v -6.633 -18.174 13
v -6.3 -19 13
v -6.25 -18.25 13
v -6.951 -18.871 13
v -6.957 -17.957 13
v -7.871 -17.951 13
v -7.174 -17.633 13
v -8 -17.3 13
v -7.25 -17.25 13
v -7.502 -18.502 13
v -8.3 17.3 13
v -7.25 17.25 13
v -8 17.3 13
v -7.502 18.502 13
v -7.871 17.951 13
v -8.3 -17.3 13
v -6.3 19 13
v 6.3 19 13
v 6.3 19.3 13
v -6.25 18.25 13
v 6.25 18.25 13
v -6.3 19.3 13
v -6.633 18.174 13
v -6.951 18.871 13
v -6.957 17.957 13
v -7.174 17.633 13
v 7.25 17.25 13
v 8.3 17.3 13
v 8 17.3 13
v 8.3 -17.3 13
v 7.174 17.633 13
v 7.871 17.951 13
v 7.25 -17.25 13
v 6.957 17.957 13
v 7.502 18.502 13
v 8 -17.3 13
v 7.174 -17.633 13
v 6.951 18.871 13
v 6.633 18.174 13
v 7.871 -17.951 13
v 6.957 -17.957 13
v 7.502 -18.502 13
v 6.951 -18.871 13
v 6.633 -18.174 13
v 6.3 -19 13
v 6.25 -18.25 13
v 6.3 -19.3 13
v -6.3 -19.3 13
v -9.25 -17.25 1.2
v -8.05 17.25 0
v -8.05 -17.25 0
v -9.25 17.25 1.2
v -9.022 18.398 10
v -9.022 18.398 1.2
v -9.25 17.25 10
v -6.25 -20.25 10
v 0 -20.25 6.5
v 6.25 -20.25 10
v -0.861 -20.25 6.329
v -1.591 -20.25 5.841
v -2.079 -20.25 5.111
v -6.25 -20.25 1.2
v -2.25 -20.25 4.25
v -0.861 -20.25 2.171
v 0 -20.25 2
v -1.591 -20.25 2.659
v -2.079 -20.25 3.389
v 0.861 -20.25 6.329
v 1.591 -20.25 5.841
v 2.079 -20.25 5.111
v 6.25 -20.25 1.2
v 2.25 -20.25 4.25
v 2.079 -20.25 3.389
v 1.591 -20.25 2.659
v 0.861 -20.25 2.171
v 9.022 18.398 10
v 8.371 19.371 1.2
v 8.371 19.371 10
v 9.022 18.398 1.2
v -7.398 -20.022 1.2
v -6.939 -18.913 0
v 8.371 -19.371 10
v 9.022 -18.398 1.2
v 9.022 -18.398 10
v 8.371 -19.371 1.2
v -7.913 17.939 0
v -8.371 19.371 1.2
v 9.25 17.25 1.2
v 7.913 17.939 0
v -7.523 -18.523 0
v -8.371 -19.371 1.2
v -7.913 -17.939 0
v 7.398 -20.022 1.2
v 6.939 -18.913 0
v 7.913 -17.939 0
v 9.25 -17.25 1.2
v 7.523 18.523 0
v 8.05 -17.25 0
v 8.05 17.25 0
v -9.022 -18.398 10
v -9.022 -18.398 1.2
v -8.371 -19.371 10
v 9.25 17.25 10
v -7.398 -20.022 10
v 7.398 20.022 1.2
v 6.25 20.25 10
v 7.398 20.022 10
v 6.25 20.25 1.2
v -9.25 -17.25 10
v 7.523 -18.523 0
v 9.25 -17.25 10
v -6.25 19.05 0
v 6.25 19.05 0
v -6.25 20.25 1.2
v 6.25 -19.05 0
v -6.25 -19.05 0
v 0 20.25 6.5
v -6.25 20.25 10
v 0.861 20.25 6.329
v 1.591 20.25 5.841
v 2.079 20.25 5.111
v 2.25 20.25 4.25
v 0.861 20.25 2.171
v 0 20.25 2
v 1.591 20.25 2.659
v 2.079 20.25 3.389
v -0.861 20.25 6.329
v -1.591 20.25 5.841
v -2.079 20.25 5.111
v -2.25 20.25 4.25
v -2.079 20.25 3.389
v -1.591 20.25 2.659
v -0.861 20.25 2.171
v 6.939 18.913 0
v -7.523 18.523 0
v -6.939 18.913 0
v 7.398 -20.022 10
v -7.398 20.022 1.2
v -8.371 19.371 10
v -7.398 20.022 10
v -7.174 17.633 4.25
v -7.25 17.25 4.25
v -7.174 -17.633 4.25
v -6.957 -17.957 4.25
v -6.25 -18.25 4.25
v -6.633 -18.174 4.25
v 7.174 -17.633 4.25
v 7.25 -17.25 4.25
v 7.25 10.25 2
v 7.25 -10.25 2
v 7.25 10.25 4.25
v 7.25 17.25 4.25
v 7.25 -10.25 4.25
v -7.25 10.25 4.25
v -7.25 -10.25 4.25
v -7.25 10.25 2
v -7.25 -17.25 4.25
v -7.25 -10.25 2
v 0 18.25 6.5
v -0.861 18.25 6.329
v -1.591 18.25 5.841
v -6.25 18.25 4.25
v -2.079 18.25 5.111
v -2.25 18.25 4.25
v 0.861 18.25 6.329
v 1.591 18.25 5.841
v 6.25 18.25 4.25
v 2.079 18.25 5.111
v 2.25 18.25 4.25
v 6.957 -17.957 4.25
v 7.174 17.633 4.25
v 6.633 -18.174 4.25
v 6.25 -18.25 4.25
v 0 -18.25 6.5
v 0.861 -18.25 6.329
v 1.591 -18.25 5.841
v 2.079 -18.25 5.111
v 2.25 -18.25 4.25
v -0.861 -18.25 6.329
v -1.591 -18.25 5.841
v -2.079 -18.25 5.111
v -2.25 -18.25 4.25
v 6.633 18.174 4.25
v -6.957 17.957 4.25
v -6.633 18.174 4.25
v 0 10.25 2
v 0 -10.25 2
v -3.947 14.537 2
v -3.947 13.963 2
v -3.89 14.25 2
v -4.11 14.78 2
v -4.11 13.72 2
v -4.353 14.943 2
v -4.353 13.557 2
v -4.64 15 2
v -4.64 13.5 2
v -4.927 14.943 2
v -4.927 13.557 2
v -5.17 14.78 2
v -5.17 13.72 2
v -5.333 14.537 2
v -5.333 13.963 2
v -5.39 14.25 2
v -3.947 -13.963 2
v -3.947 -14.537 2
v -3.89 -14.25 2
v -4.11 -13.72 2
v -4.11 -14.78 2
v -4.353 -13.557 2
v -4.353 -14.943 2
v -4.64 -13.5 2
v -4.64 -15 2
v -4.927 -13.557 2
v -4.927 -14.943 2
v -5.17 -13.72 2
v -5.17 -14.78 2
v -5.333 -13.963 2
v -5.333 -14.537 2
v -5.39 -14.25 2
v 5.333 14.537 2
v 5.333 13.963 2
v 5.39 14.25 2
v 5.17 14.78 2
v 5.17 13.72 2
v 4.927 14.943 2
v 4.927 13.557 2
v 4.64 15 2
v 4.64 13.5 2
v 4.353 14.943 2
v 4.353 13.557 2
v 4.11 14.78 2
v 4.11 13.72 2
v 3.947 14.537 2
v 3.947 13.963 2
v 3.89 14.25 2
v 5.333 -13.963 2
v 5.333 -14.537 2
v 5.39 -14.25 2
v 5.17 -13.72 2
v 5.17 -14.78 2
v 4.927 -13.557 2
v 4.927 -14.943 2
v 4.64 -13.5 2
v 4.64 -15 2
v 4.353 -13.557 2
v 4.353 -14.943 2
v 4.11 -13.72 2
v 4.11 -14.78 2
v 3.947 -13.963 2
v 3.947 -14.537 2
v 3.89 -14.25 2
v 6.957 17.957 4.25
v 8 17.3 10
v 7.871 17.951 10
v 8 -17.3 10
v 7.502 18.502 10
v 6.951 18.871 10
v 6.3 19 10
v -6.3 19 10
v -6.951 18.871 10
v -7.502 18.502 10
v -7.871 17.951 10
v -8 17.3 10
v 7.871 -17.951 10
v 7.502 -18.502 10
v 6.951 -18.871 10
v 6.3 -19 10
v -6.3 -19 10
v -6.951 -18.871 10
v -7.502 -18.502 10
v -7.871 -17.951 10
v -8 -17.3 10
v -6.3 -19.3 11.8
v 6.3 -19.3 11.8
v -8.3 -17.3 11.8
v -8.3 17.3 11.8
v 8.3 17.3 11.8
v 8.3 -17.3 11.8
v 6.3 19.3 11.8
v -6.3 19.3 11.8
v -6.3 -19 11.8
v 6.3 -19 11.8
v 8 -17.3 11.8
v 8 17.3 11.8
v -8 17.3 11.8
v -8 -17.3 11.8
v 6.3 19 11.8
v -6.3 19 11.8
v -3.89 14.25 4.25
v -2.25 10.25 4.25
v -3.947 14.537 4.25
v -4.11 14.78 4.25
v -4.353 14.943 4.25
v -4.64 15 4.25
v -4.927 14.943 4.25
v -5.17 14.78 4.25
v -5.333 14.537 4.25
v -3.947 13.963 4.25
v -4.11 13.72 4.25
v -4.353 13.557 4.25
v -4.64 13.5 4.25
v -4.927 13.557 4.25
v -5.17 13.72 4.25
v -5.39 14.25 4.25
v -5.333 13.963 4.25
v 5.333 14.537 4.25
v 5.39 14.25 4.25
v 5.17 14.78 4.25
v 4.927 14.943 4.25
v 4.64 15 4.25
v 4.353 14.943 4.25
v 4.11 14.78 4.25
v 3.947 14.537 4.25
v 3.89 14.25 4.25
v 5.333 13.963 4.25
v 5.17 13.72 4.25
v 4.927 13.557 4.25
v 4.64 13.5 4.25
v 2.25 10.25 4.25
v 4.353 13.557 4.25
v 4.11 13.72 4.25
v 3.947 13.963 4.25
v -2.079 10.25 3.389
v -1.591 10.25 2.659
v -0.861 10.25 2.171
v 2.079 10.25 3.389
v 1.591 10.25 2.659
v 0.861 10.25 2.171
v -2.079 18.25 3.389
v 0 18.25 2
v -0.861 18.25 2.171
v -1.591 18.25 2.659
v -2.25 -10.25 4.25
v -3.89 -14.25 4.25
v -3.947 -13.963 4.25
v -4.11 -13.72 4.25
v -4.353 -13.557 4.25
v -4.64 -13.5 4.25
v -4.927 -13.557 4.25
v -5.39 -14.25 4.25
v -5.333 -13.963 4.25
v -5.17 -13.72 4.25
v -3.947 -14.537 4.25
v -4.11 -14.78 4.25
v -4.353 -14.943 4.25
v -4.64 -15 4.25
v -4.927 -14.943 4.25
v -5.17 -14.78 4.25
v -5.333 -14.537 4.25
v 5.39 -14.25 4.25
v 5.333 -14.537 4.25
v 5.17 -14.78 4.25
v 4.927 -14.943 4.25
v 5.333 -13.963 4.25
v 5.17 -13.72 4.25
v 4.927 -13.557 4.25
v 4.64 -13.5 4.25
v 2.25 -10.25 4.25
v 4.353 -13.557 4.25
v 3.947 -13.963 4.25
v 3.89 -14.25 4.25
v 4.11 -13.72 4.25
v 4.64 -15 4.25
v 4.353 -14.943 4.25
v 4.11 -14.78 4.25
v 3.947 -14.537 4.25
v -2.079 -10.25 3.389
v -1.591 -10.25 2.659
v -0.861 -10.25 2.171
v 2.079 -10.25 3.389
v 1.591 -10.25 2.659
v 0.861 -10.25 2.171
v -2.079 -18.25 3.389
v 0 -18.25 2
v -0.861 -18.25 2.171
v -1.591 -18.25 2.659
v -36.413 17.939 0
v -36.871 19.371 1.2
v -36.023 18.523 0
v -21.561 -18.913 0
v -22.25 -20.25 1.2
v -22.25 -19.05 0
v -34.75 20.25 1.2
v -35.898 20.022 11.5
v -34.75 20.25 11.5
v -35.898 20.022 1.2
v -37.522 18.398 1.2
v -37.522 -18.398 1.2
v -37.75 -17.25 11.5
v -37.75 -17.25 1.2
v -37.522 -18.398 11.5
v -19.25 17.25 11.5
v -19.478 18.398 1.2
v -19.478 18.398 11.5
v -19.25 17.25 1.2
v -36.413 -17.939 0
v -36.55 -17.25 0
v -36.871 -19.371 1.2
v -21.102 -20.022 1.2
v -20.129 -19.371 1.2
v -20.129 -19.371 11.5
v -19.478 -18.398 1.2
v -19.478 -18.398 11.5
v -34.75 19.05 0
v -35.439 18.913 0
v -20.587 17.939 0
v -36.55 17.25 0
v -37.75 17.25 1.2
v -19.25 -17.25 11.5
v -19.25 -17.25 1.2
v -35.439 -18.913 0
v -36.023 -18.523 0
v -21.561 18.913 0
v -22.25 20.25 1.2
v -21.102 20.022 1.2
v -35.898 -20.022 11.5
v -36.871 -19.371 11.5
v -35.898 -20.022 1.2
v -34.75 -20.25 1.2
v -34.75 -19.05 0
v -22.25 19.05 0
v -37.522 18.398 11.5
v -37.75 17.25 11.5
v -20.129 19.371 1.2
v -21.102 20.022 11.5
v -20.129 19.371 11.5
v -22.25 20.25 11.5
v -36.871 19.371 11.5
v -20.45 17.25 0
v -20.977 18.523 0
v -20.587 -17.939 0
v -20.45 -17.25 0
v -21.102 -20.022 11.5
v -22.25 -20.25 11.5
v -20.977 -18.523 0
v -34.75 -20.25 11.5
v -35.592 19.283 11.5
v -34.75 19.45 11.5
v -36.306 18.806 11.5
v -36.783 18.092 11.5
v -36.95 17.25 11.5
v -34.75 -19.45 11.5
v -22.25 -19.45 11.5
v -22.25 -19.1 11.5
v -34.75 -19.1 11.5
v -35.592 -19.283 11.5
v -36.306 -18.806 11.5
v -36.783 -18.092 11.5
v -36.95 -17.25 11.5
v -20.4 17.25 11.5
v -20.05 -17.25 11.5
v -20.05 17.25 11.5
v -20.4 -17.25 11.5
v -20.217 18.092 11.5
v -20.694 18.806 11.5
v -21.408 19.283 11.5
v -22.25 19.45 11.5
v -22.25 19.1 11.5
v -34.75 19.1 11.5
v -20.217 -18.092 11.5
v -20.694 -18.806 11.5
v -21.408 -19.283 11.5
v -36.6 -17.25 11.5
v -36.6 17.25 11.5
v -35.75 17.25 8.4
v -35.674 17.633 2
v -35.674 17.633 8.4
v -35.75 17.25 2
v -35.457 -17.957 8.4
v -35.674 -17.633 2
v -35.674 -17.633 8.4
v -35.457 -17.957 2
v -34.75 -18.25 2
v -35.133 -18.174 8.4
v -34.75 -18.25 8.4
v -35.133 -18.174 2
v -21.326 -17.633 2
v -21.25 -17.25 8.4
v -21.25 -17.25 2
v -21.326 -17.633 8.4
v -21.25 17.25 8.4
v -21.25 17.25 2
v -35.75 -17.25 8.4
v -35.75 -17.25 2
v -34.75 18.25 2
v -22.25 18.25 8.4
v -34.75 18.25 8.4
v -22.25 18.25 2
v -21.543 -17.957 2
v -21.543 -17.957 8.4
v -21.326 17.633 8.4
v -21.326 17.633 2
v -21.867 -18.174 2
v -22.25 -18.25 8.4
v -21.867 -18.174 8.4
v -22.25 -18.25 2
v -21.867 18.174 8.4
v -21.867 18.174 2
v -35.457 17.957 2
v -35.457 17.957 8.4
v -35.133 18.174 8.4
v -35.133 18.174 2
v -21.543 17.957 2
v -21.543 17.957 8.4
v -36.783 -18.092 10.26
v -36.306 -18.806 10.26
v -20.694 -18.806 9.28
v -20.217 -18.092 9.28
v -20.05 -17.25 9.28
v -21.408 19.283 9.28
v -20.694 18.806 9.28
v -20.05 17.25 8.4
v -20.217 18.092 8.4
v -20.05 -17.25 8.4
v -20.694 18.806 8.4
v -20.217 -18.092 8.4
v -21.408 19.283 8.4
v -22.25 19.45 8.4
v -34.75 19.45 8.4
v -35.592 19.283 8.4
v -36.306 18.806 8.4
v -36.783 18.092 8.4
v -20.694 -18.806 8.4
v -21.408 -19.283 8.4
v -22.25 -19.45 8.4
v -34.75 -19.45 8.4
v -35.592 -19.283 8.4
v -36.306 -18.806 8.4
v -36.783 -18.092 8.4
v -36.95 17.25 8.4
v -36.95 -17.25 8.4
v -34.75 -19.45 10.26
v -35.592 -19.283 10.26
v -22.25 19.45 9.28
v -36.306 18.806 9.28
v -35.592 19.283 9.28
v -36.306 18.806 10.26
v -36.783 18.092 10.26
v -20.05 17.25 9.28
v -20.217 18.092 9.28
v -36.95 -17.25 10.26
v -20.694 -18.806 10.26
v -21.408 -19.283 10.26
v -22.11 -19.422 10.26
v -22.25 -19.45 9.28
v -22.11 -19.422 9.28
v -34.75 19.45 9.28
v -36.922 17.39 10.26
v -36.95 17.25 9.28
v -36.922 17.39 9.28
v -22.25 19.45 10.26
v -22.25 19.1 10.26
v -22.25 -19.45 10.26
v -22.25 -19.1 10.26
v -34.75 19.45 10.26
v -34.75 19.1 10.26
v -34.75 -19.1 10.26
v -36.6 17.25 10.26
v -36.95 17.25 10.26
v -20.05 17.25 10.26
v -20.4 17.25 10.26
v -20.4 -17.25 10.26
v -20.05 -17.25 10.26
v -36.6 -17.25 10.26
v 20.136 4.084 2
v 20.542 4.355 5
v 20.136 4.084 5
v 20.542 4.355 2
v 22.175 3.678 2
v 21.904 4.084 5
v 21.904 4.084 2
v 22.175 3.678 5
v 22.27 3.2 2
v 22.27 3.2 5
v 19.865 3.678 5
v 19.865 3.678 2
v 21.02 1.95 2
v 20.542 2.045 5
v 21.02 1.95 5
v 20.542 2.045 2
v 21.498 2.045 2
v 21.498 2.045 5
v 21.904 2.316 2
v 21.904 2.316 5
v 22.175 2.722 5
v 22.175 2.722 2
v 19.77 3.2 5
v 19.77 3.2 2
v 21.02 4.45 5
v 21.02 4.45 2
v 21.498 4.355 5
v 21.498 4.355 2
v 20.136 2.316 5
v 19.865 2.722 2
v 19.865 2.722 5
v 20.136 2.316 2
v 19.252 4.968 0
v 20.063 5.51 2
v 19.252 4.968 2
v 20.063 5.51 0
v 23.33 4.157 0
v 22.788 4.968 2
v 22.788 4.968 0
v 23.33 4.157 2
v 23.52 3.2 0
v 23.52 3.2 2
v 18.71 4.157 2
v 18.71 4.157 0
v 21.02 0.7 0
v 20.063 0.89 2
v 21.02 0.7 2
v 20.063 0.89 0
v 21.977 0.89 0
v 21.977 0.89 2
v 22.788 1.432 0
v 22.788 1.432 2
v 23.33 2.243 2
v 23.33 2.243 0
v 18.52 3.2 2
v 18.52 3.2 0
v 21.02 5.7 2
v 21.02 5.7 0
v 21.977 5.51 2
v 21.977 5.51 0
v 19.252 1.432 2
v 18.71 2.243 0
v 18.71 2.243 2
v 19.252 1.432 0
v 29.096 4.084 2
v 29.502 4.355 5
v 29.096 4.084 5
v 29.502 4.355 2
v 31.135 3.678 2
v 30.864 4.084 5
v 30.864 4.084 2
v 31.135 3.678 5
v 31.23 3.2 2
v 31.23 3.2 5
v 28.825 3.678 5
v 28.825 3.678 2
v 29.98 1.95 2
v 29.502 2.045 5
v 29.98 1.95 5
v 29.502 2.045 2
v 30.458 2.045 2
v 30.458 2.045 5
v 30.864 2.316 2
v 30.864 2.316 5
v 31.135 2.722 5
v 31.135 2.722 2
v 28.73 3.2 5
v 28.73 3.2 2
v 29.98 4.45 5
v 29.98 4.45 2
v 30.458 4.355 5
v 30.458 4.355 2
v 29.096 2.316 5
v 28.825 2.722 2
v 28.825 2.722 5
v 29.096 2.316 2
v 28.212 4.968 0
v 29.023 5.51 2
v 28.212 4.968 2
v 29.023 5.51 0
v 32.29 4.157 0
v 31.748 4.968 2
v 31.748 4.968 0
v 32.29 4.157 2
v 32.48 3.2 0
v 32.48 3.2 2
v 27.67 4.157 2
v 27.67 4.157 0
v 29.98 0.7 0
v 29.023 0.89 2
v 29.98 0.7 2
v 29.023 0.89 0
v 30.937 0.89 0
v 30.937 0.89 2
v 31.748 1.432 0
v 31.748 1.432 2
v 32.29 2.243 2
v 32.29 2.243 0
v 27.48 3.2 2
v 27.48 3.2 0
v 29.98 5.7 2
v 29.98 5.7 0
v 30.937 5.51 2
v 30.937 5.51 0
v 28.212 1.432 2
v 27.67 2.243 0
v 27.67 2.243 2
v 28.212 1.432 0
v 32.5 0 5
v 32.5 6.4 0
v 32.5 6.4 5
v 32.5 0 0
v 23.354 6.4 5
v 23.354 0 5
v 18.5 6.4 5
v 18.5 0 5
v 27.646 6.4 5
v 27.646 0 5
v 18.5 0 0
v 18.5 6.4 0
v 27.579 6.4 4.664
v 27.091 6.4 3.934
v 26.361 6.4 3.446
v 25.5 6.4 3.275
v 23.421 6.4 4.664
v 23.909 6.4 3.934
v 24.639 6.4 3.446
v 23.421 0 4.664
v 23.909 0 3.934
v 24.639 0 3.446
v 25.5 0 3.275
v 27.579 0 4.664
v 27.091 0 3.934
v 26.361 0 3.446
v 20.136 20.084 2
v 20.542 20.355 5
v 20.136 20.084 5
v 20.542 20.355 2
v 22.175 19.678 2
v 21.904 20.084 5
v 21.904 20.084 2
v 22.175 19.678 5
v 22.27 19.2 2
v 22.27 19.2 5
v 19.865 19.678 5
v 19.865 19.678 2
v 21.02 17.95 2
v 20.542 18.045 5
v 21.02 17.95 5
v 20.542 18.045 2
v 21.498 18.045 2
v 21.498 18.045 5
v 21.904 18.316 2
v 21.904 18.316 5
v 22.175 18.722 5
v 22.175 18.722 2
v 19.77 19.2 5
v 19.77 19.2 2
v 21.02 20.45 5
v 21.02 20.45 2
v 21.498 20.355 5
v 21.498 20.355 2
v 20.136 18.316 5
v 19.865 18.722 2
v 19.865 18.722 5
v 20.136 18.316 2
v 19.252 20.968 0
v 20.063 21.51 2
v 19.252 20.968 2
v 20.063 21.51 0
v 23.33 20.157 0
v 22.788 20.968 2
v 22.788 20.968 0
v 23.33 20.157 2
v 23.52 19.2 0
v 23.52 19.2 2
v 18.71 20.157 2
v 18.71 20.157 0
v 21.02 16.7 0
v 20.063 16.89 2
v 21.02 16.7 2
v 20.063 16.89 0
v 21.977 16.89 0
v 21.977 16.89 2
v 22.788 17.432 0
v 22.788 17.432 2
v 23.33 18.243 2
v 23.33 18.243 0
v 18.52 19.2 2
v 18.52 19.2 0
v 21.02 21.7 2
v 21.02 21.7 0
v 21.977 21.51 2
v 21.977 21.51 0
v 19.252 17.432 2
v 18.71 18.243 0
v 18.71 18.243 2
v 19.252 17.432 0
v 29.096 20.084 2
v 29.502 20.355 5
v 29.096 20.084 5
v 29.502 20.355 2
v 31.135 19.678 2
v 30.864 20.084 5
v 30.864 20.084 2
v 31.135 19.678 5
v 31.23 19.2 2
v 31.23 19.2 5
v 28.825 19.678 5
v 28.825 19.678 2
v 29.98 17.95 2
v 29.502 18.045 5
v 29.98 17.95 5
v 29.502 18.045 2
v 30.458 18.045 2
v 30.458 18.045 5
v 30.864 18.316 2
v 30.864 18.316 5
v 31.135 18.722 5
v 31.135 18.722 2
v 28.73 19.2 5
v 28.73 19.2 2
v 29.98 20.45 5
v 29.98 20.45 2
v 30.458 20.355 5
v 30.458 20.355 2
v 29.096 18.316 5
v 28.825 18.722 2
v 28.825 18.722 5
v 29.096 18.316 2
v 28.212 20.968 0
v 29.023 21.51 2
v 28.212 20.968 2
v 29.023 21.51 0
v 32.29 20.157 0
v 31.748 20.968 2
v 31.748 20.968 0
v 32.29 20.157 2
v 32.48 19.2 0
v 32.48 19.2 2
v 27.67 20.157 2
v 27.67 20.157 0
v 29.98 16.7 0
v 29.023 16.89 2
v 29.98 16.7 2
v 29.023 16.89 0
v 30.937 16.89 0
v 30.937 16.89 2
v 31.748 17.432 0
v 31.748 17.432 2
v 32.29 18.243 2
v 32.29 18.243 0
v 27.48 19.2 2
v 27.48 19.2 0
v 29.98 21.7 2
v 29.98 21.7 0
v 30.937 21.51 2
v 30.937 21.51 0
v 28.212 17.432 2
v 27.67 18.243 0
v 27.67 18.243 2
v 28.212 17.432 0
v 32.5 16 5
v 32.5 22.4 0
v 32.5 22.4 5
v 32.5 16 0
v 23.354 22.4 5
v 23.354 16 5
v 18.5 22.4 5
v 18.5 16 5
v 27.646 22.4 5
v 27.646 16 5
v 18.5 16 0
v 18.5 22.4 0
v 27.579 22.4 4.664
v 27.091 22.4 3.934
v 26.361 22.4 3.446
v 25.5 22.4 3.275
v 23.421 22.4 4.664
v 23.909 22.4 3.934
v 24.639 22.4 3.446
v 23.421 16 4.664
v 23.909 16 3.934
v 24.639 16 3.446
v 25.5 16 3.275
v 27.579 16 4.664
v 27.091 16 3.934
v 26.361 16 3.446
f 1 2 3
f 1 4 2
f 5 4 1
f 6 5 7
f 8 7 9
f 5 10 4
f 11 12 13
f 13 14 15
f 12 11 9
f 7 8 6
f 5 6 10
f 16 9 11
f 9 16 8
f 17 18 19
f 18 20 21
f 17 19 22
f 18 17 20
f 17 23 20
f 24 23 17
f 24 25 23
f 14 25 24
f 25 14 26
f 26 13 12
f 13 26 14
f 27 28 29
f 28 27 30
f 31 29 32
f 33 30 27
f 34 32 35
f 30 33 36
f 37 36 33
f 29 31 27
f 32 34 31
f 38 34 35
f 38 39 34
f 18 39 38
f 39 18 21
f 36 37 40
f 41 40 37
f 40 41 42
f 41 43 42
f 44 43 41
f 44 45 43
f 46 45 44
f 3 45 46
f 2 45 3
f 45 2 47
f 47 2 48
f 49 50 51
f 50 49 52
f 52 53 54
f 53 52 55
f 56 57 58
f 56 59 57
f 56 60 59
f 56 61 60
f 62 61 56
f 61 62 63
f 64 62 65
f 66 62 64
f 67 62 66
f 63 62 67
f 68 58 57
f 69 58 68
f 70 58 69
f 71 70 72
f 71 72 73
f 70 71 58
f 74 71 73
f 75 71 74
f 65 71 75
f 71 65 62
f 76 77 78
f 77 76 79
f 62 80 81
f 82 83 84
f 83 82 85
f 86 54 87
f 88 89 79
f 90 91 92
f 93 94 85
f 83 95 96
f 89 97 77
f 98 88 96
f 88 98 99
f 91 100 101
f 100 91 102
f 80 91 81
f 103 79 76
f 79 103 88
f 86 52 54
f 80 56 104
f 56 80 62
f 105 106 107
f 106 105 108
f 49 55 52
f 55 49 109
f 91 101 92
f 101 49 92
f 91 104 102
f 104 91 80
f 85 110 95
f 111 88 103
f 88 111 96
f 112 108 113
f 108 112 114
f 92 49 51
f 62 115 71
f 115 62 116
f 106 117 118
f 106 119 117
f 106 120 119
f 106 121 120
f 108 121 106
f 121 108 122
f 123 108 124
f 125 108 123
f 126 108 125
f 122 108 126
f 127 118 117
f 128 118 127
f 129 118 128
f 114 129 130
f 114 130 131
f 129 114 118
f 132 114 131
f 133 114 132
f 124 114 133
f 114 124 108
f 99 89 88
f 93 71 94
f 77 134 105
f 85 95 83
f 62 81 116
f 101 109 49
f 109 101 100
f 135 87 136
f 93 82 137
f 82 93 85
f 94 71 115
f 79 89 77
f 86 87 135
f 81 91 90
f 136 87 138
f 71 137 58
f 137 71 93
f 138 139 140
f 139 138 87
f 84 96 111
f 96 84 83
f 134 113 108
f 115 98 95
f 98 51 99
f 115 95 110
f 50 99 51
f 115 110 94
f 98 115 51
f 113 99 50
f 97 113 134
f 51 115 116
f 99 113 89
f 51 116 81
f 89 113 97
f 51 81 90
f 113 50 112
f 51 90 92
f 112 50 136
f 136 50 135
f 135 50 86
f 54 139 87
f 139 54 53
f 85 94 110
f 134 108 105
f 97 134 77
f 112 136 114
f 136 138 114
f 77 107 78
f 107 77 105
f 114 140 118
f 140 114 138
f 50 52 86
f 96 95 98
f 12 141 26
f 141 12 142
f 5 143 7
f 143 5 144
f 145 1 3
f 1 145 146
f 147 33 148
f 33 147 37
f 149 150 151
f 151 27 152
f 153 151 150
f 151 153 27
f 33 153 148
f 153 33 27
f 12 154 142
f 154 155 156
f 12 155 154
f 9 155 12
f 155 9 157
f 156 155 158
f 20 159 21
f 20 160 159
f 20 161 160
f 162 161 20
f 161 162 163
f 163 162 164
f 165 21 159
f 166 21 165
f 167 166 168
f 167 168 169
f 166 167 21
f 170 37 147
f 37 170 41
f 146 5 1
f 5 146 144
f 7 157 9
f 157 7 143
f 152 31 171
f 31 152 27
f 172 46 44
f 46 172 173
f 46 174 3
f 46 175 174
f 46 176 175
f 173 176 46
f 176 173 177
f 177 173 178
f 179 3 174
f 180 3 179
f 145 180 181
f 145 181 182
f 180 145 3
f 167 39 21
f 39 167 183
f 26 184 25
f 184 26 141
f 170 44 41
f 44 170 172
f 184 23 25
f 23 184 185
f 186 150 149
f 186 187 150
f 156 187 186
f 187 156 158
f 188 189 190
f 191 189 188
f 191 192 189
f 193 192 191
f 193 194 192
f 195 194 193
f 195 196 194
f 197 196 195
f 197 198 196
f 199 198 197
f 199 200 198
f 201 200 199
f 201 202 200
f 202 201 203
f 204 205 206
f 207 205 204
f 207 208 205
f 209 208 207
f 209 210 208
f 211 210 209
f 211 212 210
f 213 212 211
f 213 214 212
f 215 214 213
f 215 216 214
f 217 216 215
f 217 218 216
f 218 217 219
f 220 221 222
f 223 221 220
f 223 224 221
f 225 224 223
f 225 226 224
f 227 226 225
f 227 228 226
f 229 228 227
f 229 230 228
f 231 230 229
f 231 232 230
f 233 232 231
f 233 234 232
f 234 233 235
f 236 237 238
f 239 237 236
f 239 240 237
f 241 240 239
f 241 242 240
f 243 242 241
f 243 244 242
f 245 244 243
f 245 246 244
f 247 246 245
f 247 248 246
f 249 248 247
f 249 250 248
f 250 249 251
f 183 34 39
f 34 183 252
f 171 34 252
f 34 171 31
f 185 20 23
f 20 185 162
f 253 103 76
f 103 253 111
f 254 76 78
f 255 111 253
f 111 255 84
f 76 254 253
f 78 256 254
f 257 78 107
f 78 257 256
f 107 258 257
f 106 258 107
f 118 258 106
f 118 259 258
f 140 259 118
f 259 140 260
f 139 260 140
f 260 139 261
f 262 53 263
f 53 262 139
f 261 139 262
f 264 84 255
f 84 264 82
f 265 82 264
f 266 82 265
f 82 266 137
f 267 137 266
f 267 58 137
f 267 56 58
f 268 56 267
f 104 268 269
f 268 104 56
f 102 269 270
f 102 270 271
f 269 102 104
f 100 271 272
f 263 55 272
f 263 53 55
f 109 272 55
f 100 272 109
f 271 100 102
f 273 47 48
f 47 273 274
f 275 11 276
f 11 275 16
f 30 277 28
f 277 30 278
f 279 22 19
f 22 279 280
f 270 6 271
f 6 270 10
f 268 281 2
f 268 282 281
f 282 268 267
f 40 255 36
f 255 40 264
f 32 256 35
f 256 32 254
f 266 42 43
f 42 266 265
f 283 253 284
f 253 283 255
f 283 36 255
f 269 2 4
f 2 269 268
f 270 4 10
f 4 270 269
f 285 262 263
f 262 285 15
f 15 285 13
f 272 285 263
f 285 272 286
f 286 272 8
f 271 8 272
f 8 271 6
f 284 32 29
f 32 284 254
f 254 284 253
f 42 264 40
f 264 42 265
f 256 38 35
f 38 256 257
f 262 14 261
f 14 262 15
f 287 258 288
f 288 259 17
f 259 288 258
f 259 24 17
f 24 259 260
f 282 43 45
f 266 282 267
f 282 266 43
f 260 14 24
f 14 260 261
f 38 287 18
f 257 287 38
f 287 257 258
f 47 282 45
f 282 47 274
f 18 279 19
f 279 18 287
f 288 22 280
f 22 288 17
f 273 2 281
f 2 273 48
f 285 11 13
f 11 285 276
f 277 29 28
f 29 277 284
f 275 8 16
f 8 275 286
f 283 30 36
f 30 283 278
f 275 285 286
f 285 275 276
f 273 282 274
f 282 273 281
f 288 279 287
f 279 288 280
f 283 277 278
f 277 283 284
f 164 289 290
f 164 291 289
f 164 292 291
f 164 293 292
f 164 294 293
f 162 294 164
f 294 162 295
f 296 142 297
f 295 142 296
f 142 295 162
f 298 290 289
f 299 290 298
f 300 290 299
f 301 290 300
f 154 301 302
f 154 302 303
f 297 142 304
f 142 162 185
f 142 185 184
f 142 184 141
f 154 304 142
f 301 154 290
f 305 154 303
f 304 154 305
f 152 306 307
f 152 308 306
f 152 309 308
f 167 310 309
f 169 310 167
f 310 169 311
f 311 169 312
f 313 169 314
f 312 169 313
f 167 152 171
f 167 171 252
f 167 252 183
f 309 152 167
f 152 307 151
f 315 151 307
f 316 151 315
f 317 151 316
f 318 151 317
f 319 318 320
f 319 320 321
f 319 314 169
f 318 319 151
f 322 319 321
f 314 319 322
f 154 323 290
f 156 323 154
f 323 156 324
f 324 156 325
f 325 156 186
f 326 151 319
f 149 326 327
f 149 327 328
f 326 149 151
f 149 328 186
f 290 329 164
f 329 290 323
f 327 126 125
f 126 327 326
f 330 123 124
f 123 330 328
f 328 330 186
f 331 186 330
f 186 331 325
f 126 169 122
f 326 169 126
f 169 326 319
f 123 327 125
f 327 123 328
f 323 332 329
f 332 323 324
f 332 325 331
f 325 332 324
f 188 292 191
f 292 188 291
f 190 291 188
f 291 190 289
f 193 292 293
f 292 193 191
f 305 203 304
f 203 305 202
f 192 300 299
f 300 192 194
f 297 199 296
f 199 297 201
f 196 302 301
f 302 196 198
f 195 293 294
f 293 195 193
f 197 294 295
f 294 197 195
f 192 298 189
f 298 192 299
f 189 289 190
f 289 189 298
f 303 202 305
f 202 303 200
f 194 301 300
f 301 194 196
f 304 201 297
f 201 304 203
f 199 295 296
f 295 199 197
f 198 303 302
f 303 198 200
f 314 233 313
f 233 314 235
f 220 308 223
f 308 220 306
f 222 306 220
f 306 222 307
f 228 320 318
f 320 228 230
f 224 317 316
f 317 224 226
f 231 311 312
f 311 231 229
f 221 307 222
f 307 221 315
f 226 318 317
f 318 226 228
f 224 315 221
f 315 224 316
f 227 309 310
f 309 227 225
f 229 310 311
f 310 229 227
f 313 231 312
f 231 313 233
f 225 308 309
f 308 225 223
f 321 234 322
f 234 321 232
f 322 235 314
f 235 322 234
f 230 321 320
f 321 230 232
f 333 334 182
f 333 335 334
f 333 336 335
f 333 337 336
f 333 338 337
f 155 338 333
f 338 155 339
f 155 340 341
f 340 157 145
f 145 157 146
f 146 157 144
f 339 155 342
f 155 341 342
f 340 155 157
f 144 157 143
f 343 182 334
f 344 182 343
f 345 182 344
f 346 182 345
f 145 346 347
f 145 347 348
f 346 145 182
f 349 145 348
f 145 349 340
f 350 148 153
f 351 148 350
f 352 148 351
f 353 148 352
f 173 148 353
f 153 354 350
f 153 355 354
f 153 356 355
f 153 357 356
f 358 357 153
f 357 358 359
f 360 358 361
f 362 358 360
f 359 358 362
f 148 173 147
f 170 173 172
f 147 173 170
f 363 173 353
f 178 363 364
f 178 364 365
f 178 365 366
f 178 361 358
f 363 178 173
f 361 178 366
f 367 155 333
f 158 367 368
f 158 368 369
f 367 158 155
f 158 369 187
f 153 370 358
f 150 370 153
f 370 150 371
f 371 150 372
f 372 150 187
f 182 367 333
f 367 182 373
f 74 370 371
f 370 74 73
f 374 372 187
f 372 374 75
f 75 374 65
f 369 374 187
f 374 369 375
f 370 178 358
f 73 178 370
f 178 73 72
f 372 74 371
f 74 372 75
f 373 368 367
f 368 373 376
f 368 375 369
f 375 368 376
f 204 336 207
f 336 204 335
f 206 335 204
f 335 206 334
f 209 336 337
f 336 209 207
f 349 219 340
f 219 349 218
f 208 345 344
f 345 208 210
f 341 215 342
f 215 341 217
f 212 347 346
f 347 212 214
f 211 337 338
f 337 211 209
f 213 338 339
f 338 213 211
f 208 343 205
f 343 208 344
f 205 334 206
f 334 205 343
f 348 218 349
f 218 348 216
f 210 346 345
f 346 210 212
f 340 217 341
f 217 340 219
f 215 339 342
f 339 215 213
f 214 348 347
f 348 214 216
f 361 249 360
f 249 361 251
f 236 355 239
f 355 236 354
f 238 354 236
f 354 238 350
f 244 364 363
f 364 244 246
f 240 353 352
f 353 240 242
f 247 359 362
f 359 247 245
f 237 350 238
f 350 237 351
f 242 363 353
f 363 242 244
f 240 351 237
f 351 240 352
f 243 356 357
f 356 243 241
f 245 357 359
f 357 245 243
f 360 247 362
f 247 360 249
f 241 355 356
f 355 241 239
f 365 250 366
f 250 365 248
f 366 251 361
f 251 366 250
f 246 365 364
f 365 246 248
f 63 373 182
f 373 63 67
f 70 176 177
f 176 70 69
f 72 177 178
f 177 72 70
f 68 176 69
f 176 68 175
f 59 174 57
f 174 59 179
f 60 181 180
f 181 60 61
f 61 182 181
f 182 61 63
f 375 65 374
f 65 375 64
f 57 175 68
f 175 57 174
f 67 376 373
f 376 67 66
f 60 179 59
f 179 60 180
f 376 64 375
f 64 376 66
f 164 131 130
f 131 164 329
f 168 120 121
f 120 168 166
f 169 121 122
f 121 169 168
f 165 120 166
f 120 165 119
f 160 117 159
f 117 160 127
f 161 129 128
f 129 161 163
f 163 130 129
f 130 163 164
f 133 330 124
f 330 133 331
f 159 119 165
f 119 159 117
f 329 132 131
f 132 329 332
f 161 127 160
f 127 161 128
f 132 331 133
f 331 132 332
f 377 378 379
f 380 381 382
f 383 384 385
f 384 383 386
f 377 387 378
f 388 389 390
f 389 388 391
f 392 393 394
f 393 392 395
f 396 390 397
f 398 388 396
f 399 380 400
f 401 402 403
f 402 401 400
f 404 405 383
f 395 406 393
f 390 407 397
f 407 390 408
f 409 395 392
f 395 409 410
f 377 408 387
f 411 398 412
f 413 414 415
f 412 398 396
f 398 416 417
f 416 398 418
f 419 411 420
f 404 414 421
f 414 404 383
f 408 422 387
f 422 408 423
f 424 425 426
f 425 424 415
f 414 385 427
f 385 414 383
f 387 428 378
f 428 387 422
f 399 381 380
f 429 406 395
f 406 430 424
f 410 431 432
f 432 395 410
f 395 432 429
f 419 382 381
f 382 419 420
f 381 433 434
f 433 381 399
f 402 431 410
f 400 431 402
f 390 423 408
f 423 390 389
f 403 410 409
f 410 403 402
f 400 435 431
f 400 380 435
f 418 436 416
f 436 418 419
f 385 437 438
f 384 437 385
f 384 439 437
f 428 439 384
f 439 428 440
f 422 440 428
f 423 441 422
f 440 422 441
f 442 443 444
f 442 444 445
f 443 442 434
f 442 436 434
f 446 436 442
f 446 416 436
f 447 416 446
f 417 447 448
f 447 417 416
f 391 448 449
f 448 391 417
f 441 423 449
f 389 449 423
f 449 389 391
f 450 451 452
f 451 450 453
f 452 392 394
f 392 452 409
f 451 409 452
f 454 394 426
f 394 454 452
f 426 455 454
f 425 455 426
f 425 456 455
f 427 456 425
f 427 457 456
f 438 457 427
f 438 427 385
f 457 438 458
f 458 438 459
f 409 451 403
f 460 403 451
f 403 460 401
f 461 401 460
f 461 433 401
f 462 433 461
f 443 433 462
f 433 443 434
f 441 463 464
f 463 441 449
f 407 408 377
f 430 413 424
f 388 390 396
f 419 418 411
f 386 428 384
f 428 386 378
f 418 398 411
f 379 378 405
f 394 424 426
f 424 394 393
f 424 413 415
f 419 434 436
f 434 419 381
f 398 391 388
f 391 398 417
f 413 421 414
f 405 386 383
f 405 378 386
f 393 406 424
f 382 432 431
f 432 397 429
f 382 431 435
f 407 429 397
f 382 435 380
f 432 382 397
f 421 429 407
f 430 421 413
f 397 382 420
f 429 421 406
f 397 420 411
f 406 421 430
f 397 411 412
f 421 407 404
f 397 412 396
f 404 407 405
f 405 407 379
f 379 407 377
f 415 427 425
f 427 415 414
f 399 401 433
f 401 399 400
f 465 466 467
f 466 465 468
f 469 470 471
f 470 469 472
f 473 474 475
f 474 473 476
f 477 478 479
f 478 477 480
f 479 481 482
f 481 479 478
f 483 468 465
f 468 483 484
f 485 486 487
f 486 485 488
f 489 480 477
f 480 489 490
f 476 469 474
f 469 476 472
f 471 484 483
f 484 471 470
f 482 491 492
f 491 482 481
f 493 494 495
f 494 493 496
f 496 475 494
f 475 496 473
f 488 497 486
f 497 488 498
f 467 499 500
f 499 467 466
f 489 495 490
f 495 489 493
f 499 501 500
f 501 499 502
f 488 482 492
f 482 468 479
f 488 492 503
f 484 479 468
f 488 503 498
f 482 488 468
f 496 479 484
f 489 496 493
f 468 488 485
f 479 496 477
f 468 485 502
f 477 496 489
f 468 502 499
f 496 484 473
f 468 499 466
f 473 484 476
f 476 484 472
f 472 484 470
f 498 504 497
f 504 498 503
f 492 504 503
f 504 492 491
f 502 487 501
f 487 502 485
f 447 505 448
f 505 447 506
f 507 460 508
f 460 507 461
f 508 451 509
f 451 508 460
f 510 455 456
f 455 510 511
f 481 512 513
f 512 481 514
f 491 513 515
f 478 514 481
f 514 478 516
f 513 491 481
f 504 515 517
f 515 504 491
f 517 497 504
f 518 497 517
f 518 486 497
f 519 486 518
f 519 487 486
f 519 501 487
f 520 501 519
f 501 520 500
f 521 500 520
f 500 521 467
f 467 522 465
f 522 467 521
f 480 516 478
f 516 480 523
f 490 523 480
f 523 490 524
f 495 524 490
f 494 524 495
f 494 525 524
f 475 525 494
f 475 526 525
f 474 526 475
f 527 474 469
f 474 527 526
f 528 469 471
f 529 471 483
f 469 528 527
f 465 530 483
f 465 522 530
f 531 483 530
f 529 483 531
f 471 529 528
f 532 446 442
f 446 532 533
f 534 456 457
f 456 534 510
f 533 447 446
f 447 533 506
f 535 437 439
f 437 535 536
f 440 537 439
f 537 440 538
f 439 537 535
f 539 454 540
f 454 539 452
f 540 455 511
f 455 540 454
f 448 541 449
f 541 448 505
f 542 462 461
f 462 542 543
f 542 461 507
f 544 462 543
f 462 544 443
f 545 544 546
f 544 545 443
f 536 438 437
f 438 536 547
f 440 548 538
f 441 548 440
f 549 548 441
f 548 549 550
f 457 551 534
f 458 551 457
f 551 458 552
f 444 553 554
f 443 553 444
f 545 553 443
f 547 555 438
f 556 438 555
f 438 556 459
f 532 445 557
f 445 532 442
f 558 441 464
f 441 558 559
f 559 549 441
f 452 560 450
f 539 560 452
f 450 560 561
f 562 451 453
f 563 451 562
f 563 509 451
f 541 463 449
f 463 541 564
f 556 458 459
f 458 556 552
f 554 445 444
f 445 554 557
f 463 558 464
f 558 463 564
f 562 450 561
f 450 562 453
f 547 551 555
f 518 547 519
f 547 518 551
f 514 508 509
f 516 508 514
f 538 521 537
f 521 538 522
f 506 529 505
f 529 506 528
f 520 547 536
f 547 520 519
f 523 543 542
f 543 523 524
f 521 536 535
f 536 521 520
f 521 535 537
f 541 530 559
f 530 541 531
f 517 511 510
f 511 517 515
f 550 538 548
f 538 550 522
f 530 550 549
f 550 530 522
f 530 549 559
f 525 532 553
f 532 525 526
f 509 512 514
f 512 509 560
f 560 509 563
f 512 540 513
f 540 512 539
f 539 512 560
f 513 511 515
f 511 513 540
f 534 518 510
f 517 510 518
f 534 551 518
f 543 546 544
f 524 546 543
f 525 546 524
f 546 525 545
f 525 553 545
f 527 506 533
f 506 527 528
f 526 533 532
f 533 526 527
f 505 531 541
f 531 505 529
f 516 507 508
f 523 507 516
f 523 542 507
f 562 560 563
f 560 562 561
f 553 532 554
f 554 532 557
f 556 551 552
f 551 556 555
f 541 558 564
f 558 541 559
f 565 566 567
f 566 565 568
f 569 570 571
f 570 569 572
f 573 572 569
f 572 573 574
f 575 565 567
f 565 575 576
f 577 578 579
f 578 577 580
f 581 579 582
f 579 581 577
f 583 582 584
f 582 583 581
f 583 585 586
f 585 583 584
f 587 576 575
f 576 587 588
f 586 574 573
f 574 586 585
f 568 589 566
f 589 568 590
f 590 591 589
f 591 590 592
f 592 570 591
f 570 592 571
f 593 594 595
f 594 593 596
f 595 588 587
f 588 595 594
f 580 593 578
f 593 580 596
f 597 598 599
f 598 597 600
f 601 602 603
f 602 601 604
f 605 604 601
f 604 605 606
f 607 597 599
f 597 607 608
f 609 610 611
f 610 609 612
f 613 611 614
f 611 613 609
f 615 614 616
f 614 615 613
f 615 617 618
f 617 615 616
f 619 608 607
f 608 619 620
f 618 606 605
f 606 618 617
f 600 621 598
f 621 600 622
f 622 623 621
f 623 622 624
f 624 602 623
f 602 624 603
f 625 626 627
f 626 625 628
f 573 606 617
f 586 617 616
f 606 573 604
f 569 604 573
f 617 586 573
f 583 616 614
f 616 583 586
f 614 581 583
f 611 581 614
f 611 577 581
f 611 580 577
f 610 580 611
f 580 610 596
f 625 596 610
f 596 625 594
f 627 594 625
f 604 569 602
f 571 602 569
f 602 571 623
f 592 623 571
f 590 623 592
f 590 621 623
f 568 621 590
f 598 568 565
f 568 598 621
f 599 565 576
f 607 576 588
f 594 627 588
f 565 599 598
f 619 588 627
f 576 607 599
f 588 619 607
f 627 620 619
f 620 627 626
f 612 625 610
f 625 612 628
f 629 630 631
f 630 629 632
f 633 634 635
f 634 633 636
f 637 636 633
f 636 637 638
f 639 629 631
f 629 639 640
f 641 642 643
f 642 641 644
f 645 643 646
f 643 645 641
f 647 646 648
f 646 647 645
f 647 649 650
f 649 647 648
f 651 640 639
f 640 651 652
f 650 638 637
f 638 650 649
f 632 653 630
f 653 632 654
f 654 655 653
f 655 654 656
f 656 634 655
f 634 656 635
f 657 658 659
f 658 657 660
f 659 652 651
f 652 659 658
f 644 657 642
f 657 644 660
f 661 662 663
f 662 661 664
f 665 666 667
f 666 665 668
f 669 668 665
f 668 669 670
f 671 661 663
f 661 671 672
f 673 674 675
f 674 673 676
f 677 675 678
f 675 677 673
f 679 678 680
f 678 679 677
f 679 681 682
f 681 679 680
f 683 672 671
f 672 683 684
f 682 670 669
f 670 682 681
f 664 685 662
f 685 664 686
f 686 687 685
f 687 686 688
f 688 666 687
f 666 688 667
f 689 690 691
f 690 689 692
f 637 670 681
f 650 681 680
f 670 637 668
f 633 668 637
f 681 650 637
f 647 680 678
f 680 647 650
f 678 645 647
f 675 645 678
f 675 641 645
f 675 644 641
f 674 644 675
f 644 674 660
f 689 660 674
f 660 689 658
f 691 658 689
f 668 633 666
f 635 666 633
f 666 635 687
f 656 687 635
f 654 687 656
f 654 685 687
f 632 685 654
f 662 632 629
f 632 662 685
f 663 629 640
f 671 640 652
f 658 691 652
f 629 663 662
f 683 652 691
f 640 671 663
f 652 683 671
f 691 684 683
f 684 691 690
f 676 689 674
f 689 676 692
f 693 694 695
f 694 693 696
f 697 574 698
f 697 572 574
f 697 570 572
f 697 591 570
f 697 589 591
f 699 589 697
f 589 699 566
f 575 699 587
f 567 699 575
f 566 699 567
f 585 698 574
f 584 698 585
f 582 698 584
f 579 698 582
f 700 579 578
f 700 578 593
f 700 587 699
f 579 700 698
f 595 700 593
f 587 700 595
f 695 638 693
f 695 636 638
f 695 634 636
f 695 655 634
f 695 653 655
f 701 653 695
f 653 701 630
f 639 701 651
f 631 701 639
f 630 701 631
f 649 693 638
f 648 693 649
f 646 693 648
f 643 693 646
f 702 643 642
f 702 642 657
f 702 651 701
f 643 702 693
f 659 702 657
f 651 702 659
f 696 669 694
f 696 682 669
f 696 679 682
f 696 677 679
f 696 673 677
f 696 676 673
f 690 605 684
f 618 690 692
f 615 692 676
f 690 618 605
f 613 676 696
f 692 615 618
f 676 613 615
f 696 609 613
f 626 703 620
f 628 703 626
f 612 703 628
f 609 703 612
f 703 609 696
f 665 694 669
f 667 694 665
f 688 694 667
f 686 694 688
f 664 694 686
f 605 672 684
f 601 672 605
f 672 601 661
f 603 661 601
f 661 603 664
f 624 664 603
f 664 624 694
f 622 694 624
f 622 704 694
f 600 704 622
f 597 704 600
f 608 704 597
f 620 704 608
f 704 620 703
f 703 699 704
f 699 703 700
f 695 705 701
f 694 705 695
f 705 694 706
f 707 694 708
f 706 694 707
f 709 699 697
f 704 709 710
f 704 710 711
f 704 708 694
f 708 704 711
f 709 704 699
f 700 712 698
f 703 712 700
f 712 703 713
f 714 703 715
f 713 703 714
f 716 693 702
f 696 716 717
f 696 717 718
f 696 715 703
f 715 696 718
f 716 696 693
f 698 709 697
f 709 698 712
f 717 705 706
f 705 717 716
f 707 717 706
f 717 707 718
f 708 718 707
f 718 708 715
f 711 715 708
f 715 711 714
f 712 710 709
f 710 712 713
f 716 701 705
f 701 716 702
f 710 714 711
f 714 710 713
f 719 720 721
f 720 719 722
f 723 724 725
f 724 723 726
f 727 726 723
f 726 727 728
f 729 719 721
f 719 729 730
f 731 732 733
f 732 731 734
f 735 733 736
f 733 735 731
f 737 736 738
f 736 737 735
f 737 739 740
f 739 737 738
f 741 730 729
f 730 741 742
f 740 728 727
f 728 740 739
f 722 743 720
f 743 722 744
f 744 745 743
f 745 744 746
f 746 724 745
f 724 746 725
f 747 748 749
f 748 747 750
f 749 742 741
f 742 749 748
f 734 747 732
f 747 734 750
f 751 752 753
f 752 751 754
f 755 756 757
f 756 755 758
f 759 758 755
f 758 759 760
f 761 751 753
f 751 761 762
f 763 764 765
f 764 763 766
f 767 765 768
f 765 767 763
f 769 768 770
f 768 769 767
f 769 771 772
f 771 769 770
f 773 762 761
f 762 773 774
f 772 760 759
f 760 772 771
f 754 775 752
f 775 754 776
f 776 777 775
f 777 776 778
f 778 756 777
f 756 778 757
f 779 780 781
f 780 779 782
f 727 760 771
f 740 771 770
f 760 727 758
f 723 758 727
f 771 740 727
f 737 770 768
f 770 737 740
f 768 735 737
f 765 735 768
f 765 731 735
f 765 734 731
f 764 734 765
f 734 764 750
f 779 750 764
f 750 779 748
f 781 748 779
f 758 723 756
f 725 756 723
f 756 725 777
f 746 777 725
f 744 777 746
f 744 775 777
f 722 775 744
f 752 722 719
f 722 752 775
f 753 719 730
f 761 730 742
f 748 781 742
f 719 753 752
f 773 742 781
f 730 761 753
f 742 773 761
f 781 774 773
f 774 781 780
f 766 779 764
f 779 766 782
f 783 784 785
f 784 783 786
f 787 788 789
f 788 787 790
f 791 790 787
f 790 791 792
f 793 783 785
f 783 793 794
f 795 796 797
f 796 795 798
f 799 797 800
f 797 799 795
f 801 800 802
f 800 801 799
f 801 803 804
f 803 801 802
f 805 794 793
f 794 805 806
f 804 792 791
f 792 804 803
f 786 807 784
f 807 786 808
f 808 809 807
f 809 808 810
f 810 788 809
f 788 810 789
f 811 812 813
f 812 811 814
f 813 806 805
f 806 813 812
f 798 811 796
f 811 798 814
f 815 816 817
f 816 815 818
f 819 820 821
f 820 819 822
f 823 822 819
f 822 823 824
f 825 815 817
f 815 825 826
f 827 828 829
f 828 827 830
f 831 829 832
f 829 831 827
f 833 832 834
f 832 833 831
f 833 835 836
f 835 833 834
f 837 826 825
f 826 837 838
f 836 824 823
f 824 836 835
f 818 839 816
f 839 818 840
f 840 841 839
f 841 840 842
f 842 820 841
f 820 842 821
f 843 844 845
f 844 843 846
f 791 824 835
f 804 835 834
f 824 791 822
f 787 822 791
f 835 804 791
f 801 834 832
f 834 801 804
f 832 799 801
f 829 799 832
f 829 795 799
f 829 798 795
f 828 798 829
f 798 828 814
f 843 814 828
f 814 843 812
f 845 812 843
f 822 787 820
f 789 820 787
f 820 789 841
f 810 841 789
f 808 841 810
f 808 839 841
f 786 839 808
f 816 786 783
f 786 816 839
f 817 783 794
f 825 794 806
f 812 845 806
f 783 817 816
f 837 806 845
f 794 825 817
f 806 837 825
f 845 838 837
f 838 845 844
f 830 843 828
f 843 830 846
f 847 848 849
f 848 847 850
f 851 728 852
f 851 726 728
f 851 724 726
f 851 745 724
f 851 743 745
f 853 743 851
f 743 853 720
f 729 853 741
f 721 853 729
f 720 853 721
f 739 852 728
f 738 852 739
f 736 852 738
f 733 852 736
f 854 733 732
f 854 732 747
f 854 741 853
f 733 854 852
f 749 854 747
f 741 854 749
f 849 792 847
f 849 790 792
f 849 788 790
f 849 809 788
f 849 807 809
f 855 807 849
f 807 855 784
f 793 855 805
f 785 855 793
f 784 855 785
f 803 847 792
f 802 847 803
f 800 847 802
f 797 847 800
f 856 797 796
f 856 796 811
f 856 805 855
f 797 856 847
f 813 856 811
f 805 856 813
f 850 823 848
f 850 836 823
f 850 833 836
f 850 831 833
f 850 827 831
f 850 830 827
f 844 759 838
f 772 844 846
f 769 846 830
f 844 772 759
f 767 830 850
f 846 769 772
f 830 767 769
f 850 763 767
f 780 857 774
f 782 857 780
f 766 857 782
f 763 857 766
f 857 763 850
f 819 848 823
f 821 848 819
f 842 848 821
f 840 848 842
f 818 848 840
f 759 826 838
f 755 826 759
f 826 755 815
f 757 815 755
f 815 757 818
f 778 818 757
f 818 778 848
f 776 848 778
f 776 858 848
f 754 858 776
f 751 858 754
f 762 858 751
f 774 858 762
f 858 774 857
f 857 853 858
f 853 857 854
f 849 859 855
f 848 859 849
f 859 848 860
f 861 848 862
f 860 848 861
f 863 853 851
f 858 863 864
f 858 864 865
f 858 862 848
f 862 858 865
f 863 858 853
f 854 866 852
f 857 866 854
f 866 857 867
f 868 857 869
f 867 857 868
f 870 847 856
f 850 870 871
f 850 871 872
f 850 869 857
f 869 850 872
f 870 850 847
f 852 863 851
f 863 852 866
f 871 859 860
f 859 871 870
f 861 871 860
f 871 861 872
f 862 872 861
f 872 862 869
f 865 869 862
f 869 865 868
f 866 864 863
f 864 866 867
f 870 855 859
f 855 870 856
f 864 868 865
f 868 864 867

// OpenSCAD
// Terminal Block Case
// (c) 2023 Michiel Fokke <michiel@fokke.org>
// License: CC BY-SA 2.0
// https://creativecommons.org/licenses/by-sa/2.0/legalcode

// Number of facets in a circle
$fn = 16;
// $fn = 64;

// Tolerance to prevent non manifold objects (0 height)
TOL = .1;
CLEARING = .5;

// Board dimensions
X_board = 14;
Y_board = 18 + 18;
Z_board = 16;
Z_bottom_base = Z_board / 2;

// Connector dimensions
D_screw_connector = 4.5;


// Wall thickness
D = 2;
D_bottom = 2;
D_top = D_bottom;

// Strain relief dimensions
D_STRAIN_RELIEF_CABLE = 4.5;
X_MAINS_STRAIN_RELIEF = 14 + CLEARING;
Y_MAINS_STRAIN_RELIEF = 8;
Z_MAINS_STRAIN_RELIEF = D + D_STRAIN_RELIEF_CABLE/2;
Z_TOP_STRAIN_RELIEF = 5;
D_STRAIN_RELIEF_SCREW = 1.5;
D_TOP_STRAIN_RELIEF_SCREW = 2.5;
D_STRAIN_RELIEF_SCREW_CAP = 5;

// Dimensions of the case
X = X_board + 2*D + CLEARING; // board + 2* wall thickness + clearing
Y = Y_board + 2*D + CLEARING; // board + 2* wall thickness + clearing
Z = Z_board + 2*D_bottom + 3*CLEARING; // board + 2* wall thickness + clearing
Z_bottom = Z_bottom_base + D_bottom; // base + wall thickness
Z_top = Z - Z_bottom;

// Outer corner radius
R = 3;
// Size of bezel (as fraction of R) 
R_fraction = .4;

// Top ridge dimensions
top_Z_ridge = 3.1;
top_ridge_fraction_1 = .425;
top_ridge_fraction_2 = .6;
top_z_fraction = .6;

// Bottom ridge dimensions
bottom_Z_ridge = 3;
bottom_ridge_fraction_1 = .45;
bottom_ridge_fraction_2 = .6;
bottom_z_fraction = .6;

module roundcube(size, r, slant_fraction=0) {
    assert(slant_fraction>=0 && slant_fraction<=1, "slant_fraction should in [0,1]")
    assert(size[0] >= 2*r, "x dimension should be bigger than 2*r  "); 
    assert(size[1] >= 2*r, "y dimension should be bigger than 2*r"); 
    translate([-size[0]/2, -size[1]/2, 0]) {
        hull() {
            for (x=[0, size[0] - 2*r]) {
                for (y=[0, size[1] - 2*r]) {
                    translate([x + r, y + r, 0]) {
                        translate([0, 0, slant_fraction*r]) cylinder(r=r, h=size[2] - slant_fraction*r, center=false);
                        cylinder(r1=(1-slant_fraction)*r, r2=r, h=slant_fraction*r, center=false);
                    }
                }  
            }
        }
    }
}

module hollow_roundcube(size, r, d, d_bottom, slant_fraction=0) {
    assert(r > d, "radius (r) should be larger than the wall thickness (d)");
    difference() {
        roundcube(size, r, slant_fraction);
        translate([0, 0, d_bottom]) roundcube(size - [2*d, 2*d, -2*TOL], r - d);
    }
}

module hollow_roundcube_with_bottom(size, r, d, d_bottom) {
    hollow_roundcube(size, r, d, d_bottom, R_fraction);
}

module ridge_corners(size, r, d, d_bottom) {
    difference() {
        hollow_roundcube_with_bottom(size, r, d, d_bottom);
        x_1 = size[0] - 2*r;
        y_1 = size[1];
        x_shift_1 = -x_1/2;
        y_shift_1 = -size[1]/2;
        translate([x_shift_1, y_shift_1, 0]) cube([x_1, y_1, size[2]]);
        x_2 = size[0];
        y_2 = size[1] - 2*r;
        x_shift_2 = -size[0]/2;
        y_shift_2 = -y_2/2;
        translate([x_shift_2, y_shift_2, 0]) cube([x_2, y_2, size[2]]);
    }
}

module top_ridge(size, r, d) {
    size_1 = size - [2*(1 - top_ridge_fraction_1)*d,
                     2*(1 - top_ridge_fraction_1)*d,
                      size[2] - top_Z_ridge - TOL];
    size_2 = size - [2*(1 - top_ridge_fraction_2)*d,
                     2*(1 - top_ridge_fraction_2)*d,
                      size[2] - top_z_fraction*top_Z_ridge];
    corner_size = size - [2*(1 - top_ridge_fraction_2)*d,
                     2*(1 - top_ridge_fraction_2)*d,
                     size[2] - top_Z_ridge - TOL];
    roundcube(size_1, r - (size[0]-size_1[0])/2);
    roundcube(size_2, r - (size[0]-size_2[0])/2);
    ridge_corners(corner_size, r - (size[0]-size_2[0])/2, d, -TOL);
}

module ridge_corners(size, r, d, d_bottom) {
    difference() {
        hollow_roundcube_with_bottom(size, r, d, d_bottom);
        x_1 = size[0] - 2*r;
        y_1 = size[1];
        x_shift_1 = -x_1/2;
        y_shift_1 = -size[1]/2;
        translate([x_shift_1, y_shift_1, 0]) cube([x_1, y_1, size[2]]);
        x_2 = size[0];
        y_2 = size[1] - 2*r;
        x_shift_2 = -size[0]/2;
        y_shift_2 = -y_2/2;
        translate([x_shift_2, y_shift_2, 0]) cube([x_2, y_2, size[2]]);
    }
}

module bottom_ridge(size, r, d) {
    size_1 = size + [TOL, TOL, bottom_Z_ridge - size[2] + TOL];
    size_2 = size + [TOL, TOL, top_z_fraction*bottom_Z_ridge - size[2]];
    hollow_roundcube(size_1, r, bottom_ridge_fraction_1*d + TOL, -TOL);
    ridge_corners(size_1, r, bottom_ridge_fraction_2*d + TOL, -TOL);
    hollow_roundcube(size_2, r, bottom_ridge_fraction_2*d + TOL, 0);
}

module case_bottom(size, r, d, d_bottom) {
    difference(){
        size = size + [0, 0, bottom_Z_ridge];
        hollow_roundcube_with_bottom(size, r, d, d_bottom);
        translate([0, 0, size[2] - bottom_Z_ridge])
           bottom_ridge(size, r, d);
    }
}

module case_top(size, r, d, d_bottom) {
    difference(){
        hollow_roundcube_with_bottom(size, r, d, d_bottom);
        translate([0, 0, size[2] - top_Z_ridge])
           top_ridge(size, r, d);
    }
}


module connector_cut(z_connector, d_connector) {
    rotate([90, 0, 0])
        translate([0, 0, -z_connector/2])
            cylinder(d=d_connector, h=z_connector);
}


module mains_strain_relief() {
    difference() {
        cube([X_MAINS_STRAIN_RELIEF, Y_MAINS_STRAIN_RELIEF, Z_MAINS_STRAIN_RELIEF]);
        translate([.5*X_MAINS_STRAIN_RELIEF, Y_MAINS_STRAIN_RELIEF + TOL, Z_MAINS_STRAIN_RELIEF]) 
            rotate([90, 0, 0])
                cylinder(d=D_STRAIN_RELIEF_CABLE, h=Y_MAINS_STRAIN_RELIEF + 2*TOL);
        translate([.18*X_MAINS_STRAIN_RELIEF, Y_MAINS_STRAIN_RELIEF/2, -TOL])
            cylinder(d=D_STRAIN_RELIEF_SCREW, h=Z_MAINS_STRAIN_RELIEF + 2*TOL);
        translate([.82*X_MAINS_STRAIN_RELIEF, Y_MAINS_STRAIN_RELIEF/2, -TOL])
            cylinder(d=D_STRAIN_RELIEF_SCREW, h=Z_MAINS_STRAIN_RELIEF + 2*TOL);
    }
}

module top_strain_relief() {
    difference() {
        y_top = .8*Y_MAINS_STRAIN_RELIEF;
        x_top = X_MAINS_STRAIN_RELIEF - CLEARING;
        cube([x_top, y_top, Z_TOP_STRAIN_RELIEF]);
        translate([.5*x_top, Y_MAINS_STRAIN_RELIEF + TOL, 1.3*Z_MAINS_STRAIN_RELIEF]) 
            rotate([90, 0, 0])
                cylinder(d=D_STRAIN_RELIEF_CABLE, h=Y_MAINS_STRAIN_RELIEF + 2*TOL);
        translate([.18*x_top, y_top/2, TOL]) {
            cylinder(d=D_TOP_STRAIN_RELIEF_SCREW, h=2*Z_MAINS_STRAIN_RELIEF);
            translate([0, 0, -2*TOL])
                cylinder(d=D_STRAIN_RELIEF_SCREW_CAP, h=2 + TOL);
        }
        translate([.82*x_top, y_top/2, TOL]) {
            cylinder(d=D_TOP_STRAIN_RELIEF_SCREW, h=2*Z_MAINS_STRAIN_RELIEF);
            translate([0, 0, -2*TOL])
                cylinder(d=D_STRAIN_RELIEF_SCREW_CAP, h=2 + TOL);
        }
    }
}


module complete_bottom() {
    difference(){
        union(){
            case_bottom([X, Y, Z_bottom], R, D, D_bottom);
            translate([-X_MAINS_STRAIN_RELIEF/2, Y/2 - D - Y_MAINS_STRAIN_RELIEF, 0])
                mains_strain_relief();
            translate([-X_MAINS_STRAIN_RELIEF/2, -Y/2 + D, 0])
                mains_strain_relief();
        }
        translate([0, -Y/2 + D/2, D_screw_connector/2 + D_bottom])
            connector_cut(D+2*TOL, D_screw_connector);
        translate([0, Y/2 - D/2, D_screw_connector/2 + D_bottom])
            connector_cut(D+2*TOL, D_screw_connector);
    }
}

module complete_top() {
    case_top([X, Y, Z_top], R, D, D_top);
}

// ---------------------------------- MAIN ---------------------------------- //
orientation = 0;
cut = 0;

difference(){
    complete_bottom();
    if (cut == 1)
        translate([-50, 0*(Y-D)/2, -.1]) cube(size=[100, 100, 100], center=false);
}

translate([-(1 - orientation)*(X + 10), 0, orientation*(Z+TOL)]) {
    rotate([0, orientation*180, 0])
        difference(){
            complete_top();
    if (cut == 1)
        translate([-50, 0*(Y-D)/2, -50]) cube(size=[100, 100, 100], center=false);
    }
}

translate([X, 0, 0]) {
    top_strain_relief();
    translate([0, 2*Y_MAINS_STRAIN_RELIEF, 0])
        top_strain_relief();
}
